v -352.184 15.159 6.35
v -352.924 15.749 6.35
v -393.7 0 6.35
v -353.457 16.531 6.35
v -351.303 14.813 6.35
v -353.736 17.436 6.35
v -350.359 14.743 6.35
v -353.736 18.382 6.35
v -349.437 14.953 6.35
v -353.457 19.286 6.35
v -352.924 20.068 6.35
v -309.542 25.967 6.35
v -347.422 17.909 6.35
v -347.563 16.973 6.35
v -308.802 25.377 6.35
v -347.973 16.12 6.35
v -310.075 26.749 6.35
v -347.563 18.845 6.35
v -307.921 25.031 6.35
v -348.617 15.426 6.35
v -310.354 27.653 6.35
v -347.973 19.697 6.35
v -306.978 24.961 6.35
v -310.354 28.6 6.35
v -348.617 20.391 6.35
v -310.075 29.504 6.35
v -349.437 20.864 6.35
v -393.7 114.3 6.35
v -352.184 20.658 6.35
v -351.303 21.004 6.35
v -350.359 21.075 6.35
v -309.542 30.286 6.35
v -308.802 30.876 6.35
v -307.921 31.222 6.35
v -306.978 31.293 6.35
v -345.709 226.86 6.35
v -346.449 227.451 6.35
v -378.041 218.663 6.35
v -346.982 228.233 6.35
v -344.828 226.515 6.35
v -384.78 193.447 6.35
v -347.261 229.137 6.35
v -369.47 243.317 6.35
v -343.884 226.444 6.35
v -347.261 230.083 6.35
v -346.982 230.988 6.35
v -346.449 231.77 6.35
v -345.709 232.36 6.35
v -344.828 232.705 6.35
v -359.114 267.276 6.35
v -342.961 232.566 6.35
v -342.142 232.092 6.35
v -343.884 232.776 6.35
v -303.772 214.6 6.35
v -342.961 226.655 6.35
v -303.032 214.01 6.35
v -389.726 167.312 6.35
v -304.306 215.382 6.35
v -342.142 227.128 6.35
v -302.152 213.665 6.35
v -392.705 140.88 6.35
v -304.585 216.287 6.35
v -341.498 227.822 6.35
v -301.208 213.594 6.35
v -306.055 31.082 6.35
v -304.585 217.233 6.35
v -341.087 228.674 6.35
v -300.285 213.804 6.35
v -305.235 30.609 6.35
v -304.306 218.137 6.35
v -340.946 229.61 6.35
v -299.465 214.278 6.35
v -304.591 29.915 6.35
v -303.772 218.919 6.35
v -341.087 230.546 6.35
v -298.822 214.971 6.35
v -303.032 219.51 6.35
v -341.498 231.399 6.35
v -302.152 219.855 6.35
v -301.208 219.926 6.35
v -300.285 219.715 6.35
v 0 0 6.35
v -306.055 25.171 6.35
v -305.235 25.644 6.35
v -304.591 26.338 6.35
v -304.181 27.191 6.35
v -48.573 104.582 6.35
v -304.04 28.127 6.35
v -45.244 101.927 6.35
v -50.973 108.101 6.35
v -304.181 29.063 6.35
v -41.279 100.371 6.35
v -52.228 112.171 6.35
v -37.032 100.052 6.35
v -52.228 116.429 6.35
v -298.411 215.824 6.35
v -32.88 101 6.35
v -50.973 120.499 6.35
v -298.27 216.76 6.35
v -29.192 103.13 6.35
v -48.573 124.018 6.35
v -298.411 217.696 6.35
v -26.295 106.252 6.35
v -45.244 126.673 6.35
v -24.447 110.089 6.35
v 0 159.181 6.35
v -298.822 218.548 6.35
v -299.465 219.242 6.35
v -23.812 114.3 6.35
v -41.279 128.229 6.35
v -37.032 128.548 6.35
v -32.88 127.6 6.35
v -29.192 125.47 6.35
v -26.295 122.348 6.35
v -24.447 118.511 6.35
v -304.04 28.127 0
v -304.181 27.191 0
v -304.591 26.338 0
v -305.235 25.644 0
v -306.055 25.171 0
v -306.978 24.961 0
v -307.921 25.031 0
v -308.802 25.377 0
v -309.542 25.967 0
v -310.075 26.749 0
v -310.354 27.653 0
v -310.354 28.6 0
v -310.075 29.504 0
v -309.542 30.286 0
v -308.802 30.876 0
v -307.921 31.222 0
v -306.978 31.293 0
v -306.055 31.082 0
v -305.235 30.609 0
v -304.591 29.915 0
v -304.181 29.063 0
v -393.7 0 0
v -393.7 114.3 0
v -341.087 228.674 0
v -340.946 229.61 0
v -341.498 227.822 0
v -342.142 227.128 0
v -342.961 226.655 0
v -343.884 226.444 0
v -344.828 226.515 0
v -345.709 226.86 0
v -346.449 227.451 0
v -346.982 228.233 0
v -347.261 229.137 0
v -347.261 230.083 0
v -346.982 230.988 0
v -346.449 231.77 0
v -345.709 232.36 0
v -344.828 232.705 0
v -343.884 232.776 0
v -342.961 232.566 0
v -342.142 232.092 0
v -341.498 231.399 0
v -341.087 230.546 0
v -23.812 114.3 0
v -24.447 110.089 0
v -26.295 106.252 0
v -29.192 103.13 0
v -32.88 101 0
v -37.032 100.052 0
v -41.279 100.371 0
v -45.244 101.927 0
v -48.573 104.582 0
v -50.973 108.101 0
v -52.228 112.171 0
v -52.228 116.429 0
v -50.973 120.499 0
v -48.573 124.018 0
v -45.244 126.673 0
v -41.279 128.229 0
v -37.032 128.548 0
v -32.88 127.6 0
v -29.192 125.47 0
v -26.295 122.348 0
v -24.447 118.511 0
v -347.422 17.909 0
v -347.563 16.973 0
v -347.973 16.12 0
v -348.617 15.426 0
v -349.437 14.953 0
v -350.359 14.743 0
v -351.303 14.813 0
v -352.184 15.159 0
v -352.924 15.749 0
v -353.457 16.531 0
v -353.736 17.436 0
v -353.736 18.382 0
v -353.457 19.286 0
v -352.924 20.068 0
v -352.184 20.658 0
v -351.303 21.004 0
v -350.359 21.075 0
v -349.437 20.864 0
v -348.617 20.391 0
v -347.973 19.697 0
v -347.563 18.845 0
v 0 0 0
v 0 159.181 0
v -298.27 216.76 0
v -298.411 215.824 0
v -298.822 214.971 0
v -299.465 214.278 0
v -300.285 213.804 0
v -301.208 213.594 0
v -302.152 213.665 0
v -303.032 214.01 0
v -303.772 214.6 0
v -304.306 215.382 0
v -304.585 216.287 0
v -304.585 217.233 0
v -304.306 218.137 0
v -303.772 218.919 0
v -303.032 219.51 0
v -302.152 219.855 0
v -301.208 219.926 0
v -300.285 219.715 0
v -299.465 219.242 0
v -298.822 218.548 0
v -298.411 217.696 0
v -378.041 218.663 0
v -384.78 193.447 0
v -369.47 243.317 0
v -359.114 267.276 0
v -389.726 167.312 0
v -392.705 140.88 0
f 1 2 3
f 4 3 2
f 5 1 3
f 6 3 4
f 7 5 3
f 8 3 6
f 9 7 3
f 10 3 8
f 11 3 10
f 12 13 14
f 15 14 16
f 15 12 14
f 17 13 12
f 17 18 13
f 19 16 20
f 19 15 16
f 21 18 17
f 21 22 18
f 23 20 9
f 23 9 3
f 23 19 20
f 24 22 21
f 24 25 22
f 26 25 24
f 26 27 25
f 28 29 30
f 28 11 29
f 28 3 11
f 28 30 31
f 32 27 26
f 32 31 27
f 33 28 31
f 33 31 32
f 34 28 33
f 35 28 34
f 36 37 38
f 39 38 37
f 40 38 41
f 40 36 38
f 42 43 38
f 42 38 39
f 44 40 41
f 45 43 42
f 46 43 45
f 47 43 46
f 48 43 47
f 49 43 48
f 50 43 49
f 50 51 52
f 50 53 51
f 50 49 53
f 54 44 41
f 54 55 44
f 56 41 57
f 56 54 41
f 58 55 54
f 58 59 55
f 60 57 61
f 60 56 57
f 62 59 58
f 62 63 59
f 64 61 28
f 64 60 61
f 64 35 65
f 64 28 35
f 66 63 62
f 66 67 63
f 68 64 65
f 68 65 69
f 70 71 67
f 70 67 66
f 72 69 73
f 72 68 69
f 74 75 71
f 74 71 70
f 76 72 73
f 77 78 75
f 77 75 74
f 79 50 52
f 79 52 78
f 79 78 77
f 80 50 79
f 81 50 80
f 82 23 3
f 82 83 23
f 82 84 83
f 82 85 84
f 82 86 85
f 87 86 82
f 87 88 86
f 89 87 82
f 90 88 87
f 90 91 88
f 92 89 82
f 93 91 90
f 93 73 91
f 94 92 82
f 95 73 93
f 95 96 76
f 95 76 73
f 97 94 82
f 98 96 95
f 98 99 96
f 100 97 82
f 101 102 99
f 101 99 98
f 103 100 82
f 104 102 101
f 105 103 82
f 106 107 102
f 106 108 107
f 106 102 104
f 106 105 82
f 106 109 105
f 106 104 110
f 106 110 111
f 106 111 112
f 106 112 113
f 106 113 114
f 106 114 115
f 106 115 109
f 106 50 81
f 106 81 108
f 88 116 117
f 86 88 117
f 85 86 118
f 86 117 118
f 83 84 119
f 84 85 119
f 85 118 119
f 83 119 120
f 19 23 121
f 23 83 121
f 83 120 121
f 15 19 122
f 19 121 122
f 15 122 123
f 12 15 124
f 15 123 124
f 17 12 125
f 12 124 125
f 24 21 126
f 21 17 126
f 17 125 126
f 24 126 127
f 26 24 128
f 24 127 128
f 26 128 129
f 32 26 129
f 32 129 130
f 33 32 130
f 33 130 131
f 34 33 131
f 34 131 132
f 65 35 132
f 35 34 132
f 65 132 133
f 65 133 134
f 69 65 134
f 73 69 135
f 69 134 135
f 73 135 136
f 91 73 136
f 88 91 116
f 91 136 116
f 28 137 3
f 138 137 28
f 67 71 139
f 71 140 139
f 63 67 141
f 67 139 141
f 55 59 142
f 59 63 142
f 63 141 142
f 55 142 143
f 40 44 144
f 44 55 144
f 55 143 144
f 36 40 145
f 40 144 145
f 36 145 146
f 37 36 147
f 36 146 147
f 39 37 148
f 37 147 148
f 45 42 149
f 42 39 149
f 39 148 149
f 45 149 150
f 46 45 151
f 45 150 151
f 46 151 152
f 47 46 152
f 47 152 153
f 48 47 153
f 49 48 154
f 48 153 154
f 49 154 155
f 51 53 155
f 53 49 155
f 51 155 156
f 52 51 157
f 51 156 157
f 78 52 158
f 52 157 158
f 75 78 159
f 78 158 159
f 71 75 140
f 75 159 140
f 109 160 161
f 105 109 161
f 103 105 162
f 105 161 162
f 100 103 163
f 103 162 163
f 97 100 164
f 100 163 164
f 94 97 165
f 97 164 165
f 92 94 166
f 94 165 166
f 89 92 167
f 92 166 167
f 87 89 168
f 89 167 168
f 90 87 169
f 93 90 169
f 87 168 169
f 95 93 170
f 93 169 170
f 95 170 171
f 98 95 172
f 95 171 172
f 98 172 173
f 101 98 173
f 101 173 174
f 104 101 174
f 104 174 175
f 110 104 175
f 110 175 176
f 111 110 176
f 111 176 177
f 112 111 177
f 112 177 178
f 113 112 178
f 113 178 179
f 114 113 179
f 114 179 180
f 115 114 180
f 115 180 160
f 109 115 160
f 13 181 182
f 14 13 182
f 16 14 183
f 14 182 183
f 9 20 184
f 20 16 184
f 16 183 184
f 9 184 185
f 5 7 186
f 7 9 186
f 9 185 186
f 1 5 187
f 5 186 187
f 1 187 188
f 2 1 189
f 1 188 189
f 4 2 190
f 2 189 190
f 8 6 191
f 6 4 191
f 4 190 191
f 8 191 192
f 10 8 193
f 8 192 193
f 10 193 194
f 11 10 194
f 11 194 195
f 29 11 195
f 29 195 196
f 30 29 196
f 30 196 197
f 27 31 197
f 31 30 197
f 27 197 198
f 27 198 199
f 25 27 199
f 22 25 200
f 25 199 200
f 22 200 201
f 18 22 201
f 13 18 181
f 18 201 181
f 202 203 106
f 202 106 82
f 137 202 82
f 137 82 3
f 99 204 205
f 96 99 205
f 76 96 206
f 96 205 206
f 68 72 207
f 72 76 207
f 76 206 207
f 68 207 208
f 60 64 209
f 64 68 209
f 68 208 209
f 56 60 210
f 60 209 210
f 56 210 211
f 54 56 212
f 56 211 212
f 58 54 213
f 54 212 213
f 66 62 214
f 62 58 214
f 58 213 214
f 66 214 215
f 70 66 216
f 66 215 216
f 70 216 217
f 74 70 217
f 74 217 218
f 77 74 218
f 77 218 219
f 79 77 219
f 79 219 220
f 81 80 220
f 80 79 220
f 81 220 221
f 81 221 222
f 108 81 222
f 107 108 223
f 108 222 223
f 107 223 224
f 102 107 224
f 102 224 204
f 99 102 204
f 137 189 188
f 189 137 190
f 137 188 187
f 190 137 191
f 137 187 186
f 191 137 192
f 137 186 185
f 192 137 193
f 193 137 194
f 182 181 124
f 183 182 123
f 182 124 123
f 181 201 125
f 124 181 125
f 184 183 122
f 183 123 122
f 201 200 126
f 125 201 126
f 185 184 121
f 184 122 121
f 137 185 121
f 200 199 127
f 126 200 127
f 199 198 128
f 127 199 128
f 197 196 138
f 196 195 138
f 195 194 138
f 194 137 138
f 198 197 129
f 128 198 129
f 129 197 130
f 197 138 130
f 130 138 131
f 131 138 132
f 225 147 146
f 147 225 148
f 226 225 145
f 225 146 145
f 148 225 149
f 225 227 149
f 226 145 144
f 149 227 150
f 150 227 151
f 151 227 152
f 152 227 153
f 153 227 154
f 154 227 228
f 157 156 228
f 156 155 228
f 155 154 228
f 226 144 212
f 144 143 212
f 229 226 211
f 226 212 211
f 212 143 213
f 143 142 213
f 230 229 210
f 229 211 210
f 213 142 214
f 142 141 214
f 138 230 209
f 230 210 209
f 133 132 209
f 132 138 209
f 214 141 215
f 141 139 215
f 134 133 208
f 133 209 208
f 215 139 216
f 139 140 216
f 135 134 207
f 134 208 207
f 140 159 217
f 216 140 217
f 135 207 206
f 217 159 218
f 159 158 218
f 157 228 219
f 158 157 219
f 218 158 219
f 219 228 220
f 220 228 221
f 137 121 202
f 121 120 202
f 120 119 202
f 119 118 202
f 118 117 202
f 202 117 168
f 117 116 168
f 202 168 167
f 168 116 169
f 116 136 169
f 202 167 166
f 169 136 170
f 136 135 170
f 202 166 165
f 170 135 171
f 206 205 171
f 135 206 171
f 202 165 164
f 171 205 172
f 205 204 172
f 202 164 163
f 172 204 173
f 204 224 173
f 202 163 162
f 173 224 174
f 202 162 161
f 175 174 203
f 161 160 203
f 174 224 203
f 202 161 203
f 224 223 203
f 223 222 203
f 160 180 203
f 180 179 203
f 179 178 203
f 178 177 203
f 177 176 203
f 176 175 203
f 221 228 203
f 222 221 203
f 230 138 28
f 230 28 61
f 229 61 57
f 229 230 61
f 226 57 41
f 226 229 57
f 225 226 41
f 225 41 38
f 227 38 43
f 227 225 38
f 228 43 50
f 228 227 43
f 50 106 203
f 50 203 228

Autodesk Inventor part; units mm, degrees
ref_plane "YZ Plane" through (0, 0, 0) normal (1, 0, 0) x (0, 1, 0)
ref_plane "XZ Plane" through (0, 0, 0) normal (0, 1, 0) x (-1, 0, 0)
ref_plane "XY Plane" through (0, 0, 0) normal (0, 0, 1) x (1, 0, 0)
sketch "Sketch1" plane through (0, 0, 0) normal (0, 0, 1) x (1, 0, 0)
  line L0 (0, 0) -> (-393.7, 0)
  line L1 (-393.7, 0) -> (-393.7, 114.3)
  line L2 (0, 203.2) -> (0, 0)
  circle A0 centre (-38.1, 114.3) radius 50.8 construction
  circle A1 centre (-38.1, 114.3) radius 6.35 construction
  circle A2 centre (-38.1, 114.3) radius 14.2875
  line L3 (-38.1, 114.3) -> (-38.1, 165.1)
  arc A3 (-384.7802, 193.4467) -> (-393.7, 114.3) centre (-38.1, 114.3) ccw
  arc A4 (-338.2351, 305.01) -> (-393.6892, 111.5268) centre (-38.1, 114.3) ccw
  circle A5 centre (-38.1, 114.3) radius 282.575 construction
  circle A6 centre (-38.1, 114.3) radius 327.025 construction
  circle A7 centre (-38.1, 114.3) radius 304.8 construction
  arc A8 (-372.5283, 214.9641) -> (-378.0555, 34.2635) centre (-38.1, 114.3) ccw
  arc A9 (-287.4011, 189.3405) -> (-291.5214, 54.6365) centre (-38.1, 114.3) ccw
  arc A10 (-287.4011, 189.3405) -> (-372.5283, 214.9641) centre (-329.9647, 202.1523) ccw construction
  arc A11 (-378.0555, 34.2635) -> (-291.5214, 54.6365) centre (-334.7884, 44.45) ccw construction
  line L4 (-38.1, 114.3) -> (-329.9647, 202.1523) construction
  line L5 (-38.1, 114.3) -> (-334.7884, 44.45) construction
  circle A12 centre (-301.445, 216.7599) radius 3.175
  circle A13 centre (-344.1211, 229.6101) radius 3.175
  circle A14 centre (-350.5965, 17.9088) radius 3.175
  circle A15 centre (-307.2148, 28.1267) radius 3.175
  line L6 (0, 203.2) -> (-338.2351, 305.01)
  point P0 (-356.4219, 39.3568)
  point P1 (-313.1549, 49.5432)
  point P2 (-308.6829, 195.7464)
  point P3 (-351.2465, 208.5582)
  point P4 (-384.7802, 193.4467)
  dimension "d2" = 101.6
  dimension "d38" = 609.6
  dimension "d3" = 12.7
  dimension "d4" = 28.575
  dimension "d5" = 114.3
  dimension "d22" = 114.3
  dimension "d24" = 38.1
  dimension "d25" = 304.8
  dimension "d30" = 565.15
  dimension "d31" = 654.05
  dimension "d39" = 30
  dimension "d40" = 88.9
  dimension "d43" = 6.35
  dimension "d44" = 6.35
  dimension "d45" = 6.35
  dimension "d46" = 6.35
  dimension "d47" = 22.225
  dimension "d48" = 22.225
  dimension "d49" = 22.225
  dimension "d50" = 22.225
  dimension "d51" = 203.2
extrude "Extrusion1" add sketch "Sketch1" along normal blind 6.35
sketch "Sketch2" plane through (0, 0, 6.35) normal (0, 0, 1) x (1, 0, 0)
  point P0 (0, 0)
sketch "Sketch3" plane through (0, 0, 6.35) normal (0, 0, 1) x (1, 0, 0)
  line L0 (0, 0) -> (0, 203.2) projected
  line L1 (0, 203.2) -> (-338.2351, 305.01) projected
  arc A0 (-338.2351, 305.01) -> (-393.7, 114.3) centre (-38.1, 114.3) ccw projected
  line L2 (-393.7, 114.3) -> (-393.7, 0) projected
  line L3 (-393.7, 0) -> (0, 0) projected
  circle A1 centre (-38.1, 114.3) radius 14.2875 projected
  circle A2 centre (-350.5965, 17.9088) radius 3.175 projected
  circle A3 centre (-307.2148, 28.1267) radius 3.175 projected
  circle A4 centre (-344.1211, 229.6101) radius 3.175 projected
  circle A5 centre (-301.445, 216.7599) radius 3.175 projected
  line L4 (0, 0) -> (0, 203.2) projected
  line L5 (0, 159.181) -> (-359.1138, 267.2755)
  dimension "d52" = 31.75
extrude "Extrusion2" cut sketch "Sketch3" against normal blind 25.4 contours L5 A0 L1 L0
properties part number "TurretPanel"
